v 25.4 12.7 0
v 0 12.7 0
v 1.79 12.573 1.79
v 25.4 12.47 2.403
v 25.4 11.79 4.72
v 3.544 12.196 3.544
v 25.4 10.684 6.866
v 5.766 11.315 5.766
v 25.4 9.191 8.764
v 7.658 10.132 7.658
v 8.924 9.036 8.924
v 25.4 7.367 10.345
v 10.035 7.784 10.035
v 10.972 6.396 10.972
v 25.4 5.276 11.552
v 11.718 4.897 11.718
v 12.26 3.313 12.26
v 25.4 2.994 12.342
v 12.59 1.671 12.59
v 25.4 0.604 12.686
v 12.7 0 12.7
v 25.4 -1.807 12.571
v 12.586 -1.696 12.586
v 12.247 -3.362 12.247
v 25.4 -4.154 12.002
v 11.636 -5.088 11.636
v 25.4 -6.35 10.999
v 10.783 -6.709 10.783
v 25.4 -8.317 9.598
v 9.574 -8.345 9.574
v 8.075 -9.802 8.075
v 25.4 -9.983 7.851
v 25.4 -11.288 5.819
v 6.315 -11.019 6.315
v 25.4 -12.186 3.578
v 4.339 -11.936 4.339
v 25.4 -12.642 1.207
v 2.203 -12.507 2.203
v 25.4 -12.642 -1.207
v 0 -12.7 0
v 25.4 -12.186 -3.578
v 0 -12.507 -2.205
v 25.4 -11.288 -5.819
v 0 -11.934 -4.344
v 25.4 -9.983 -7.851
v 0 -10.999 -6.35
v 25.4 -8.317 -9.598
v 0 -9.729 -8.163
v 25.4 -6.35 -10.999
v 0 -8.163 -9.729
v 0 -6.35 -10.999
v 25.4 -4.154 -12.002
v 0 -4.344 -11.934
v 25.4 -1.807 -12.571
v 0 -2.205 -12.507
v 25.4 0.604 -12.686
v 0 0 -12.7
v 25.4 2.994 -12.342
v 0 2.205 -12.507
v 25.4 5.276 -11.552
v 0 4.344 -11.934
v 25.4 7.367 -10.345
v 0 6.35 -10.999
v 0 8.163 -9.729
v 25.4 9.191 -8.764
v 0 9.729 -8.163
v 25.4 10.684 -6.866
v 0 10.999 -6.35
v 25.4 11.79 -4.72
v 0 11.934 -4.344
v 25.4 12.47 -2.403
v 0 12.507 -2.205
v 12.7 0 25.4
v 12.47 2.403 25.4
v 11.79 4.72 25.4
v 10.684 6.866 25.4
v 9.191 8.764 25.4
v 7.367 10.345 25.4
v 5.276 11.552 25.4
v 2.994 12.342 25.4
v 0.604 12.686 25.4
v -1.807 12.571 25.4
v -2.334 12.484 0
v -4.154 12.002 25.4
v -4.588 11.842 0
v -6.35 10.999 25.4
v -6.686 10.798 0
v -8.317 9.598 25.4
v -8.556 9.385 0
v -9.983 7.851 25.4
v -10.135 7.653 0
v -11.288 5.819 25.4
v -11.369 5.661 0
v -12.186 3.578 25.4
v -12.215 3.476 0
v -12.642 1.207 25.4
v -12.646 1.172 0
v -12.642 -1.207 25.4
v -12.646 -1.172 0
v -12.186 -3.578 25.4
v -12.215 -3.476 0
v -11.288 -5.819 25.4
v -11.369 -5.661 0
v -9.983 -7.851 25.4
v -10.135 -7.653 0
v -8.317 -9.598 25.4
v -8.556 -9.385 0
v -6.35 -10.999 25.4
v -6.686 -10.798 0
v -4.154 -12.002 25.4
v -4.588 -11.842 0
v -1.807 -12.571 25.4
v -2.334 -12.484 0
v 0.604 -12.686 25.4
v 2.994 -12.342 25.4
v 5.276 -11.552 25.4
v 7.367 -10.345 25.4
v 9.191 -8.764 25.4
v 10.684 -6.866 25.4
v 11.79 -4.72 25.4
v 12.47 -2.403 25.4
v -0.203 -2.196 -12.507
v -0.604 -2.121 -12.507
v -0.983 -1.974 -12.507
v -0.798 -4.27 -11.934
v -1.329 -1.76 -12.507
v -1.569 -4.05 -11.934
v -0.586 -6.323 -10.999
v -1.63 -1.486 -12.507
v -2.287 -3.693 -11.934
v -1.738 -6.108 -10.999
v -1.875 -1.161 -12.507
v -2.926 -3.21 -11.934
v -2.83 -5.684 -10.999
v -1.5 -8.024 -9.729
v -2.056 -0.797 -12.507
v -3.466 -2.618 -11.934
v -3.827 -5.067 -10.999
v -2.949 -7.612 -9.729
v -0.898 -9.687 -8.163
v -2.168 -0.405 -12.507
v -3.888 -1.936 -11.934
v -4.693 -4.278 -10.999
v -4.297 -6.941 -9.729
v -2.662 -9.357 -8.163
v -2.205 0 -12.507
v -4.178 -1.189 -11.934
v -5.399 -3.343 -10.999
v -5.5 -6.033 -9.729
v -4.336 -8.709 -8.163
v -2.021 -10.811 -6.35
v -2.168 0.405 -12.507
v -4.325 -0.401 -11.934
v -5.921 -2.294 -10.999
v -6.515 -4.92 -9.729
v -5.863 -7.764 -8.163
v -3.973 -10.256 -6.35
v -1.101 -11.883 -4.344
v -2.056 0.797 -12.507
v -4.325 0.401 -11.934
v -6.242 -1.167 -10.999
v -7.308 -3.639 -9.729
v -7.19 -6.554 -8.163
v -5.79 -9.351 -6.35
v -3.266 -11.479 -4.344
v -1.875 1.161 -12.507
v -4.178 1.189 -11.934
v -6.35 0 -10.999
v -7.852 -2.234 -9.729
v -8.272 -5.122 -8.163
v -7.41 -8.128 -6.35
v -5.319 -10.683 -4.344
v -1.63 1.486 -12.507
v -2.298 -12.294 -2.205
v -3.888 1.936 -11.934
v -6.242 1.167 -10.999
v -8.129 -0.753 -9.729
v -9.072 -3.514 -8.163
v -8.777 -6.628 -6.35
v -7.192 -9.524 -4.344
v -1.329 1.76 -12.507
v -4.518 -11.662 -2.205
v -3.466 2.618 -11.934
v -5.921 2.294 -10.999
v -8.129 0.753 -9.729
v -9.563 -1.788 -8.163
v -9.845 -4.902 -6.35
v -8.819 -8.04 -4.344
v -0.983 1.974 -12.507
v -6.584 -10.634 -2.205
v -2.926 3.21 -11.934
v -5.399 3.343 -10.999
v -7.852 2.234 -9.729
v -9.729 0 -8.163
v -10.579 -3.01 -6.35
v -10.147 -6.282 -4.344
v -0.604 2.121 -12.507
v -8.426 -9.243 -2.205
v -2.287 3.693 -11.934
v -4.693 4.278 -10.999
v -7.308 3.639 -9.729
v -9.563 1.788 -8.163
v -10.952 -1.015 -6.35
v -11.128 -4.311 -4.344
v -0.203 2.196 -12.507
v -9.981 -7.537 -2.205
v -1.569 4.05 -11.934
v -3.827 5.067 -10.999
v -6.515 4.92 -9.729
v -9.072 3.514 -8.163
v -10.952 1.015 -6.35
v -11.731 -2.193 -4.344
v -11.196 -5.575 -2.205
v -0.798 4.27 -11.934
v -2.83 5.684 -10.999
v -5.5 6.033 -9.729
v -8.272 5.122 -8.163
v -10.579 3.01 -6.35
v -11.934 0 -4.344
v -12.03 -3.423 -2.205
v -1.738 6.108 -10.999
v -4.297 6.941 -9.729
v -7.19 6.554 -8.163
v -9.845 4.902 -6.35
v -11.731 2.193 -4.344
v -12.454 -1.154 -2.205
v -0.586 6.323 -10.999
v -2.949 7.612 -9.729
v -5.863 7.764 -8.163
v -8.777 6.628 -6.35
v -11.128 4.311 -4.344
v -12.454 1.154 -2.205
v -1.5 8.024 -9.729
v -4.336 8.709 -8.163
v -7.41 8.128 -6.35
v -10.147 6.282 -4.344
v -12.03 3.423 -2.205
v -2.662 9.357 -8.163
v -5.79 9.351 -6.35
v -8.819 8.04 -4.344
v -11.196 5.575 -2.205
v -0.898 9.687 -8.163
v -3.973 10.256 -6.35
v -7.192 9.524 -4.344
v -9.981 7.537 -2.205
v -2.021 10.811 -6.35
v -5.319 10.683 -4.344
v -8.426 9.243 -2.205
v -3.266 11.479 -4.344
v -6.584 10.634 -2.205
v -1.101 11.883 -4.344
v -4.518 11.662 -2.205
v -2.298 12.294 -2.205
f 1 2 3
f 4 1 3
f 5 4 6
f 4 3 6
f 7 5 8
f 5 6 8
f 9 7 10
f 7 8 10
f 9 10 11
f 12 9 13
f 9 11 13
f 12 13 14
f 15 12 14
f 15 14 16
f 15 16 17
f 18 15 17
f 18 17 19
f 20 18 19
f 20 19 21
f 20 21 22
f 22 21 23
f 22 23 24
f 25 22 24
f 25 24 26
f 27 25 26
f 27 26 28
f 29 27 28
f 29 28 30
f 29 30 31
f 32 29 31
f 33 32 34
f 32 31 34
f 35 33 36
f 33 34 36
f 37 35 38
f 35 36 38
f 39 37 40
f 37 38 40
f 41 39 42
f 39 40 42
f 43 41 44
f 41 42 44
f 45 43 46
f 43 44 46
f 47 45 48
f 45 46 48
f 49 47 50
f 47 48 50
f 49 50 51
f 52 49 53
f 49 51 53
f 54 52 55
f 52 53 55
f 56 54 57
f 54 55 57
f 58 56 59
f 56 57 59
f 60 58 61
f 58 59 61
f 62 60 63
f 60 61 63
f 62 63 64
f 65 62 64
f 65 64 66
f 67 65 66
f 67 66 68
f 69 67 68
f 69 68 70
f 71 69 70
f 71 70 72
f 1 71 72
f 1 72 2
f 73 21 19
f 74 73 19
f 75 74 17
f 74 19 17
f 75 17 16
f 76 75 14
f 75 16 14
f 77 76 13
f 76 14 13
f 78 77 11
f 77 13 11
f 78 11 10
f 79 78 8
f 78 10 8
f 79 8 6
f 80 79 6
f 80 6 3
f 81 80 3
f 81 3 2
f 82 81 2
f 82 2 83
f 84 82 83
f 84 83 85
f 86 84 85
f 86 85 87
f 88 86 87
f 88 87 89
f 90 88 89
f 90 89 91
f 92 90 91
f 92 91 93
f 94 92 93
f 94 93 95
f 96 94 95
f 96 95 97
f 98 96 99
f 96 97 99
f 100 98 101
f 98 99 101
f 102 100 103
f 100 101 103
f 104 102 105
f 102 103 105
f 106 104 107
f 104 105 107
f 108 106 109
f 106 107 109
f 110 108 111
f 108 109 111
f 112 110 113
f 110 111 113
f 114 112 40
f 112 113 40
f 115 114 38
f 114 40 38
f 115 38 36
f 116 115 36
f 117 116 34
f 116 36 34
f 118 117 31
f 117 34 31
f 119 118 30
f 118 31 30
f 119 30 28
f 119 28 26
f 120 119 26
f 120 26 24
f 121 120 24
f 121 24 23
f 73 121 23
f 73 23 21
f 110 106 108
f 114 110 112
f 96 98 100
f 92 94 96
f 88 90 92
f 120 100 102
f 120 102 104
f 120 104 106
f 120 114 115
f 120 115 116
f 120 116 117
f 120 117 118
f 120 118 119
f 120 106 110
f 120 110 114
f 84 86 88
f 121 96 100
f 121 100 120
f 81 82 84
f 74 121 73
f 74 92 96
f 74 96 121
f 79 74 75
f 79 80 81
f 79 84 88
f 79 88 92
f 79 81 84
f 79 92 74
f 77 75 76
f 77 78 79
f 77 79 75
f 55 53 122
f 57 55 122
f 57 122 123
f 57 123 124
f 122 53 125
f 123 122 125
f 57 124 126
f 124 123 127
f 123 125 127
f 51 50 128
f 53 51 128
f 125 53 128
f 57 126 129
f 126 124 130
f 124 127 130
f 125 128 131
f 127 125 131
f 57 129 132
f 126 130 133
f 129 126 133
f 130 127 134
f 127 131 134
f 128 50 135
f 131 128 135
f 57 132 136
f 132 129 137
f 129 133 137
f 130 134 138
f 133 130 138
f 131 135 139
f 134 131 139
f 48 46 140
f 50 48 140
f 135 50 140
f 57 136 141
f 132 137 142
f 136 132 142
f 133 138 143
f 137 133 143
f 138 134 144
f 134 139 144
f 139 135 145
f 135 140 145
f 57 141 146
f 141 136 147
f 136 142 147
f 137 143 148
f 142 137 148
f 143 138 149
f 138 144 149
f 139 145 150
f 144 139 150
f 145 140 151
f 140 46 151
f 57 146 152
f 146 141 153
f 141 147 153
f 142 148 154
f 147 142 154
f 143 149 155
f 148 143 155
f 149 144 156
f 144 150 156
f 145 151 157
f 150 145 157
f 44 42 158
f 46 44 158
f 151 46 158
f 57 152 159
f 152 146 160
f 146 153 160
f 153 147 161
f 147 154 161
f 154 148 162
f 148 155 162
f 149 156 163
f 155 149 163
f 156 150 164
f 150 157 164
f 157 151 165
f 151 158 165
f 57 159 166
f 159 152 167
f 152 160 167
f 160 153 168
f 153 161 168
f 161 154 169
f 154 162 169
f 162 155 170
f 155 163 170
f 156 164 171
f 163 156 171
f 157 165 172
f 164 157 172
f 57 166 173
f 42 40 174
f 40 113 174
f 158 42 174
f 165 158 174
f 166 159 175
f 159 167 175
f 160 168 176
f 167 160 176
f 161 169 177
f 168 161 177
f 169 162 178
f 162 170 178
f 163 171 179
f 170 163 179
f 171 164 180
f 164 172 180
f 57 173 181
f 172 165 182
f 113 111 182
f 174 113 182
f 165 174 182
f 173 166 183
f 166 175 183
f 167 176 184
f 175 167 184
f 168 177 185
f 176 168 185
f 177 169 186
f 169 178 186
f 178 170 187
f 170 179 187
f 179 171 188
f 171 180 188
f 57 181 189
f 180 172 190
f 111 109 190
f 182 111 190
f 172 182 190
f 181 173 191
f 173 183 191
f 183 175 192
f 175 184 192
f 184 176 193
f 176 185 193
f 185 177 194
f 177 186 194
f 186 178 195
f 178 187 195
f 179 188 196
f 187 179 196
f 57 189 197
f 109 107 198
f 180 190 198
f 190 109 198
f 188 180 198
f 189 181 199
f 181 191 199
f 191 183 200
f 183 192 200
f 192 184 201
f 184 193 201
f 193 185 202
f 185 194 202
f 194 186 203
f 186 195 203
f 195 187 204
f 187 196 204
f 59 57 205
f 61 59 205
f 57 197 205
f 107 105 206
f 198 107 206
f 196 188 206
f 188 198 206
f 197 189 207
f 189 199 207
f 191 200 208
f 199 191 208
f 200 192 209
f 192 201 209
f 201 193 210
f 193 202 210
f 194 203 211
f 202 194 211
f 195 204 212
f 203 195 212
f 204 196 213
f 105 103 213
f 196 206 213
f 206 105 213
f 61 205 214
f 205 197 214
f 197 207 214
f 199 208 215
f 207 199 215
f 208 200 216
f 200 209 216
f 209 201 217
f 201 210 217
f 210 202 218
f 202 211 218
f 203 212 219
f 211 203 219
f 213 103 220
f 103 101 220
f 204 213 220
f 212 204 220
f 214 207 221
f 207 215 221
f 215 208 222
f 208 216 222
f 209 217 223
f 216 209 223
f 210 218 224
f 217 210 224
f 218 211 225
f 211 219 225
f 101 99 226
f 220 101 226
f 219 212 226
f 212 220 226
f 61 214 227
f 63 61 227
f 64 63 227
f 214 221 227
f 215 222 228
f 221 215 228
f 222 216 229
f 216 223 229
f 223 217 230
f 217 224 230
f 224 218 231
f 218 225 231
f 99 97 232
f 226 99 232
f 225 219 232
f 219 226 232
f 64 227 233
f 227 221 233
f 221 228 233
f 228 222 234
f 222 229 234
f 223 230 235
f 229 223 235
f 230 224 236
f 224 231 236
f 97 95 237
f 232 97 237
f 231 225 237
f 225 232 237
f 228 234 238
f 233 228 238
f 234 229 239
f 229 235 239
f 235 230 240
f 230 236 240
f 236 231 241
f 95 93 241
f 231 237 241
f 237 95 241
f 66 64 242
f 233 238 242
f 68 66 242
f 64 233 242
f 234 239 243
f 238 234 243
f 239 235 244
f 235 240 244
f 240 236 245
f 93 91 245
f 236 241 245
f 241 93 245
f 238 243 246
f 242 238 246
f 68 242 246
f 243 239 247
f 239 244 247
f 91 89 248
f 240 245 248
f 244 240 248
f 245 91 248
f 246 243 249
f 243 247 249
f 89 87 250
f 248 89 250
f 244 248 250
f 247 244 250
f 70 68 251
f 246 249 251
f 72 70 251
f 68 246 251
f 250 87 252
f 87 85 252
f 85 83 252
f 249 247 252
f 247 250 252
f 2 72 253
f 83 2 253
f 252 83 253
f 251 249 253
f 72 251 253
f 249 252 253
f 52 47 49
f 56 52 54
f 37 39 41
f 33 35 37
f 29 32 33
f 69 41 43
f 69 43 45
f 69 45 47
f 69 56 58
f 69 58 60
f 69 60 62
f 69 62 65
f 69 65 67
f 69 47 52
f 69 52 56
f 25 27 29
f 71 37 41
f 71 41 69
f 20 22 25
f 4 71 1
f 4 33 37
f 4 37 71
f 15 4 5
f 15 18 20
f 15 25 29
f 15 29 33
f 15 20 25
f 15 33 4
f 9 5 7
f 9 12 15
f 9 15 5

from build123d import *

# Parameters (mm, degrees)
F2_R     = 12.7
F3_DEPTH = 25.4
F7_R     = 12.7
F8_DEPTH = 25.4


# Not quite as in the source:
# - the program builds the solid bodies; features that only make, move or delete a surface that nothing else refers to are left out


with BuildPart() as f1:
    # F0 (on Front) → F1 (revolve)
    with BuildSketch(Plane.XZ):
        with BuildLine():
            ThreePointArc((0, -12.7), (8.9802561211, -8.9802561211), (12.7, 0))
            ThreePointArc((12.7, 0), (8.9802561211, 8.9802561211), (0, 12.7))
            Line((0, 12.7), (0, -12.7))
        make_face()
    revolve(axis=Axis((0, 0, -1.3322243467), (0, 0, -1)))

    # F2 (on Right) → F3 (join)
    with BuildSketch(Plane.YZ):
        Circle(F2_R)
    extrude(amount=F3_DEPTH)

    # F7 (on Top) → F8 (join)
    with BuildSketch(Plane.XY):
        Circle(F7_R)
    extrude(amount=F8_DEPTH)


solid = f1.part
